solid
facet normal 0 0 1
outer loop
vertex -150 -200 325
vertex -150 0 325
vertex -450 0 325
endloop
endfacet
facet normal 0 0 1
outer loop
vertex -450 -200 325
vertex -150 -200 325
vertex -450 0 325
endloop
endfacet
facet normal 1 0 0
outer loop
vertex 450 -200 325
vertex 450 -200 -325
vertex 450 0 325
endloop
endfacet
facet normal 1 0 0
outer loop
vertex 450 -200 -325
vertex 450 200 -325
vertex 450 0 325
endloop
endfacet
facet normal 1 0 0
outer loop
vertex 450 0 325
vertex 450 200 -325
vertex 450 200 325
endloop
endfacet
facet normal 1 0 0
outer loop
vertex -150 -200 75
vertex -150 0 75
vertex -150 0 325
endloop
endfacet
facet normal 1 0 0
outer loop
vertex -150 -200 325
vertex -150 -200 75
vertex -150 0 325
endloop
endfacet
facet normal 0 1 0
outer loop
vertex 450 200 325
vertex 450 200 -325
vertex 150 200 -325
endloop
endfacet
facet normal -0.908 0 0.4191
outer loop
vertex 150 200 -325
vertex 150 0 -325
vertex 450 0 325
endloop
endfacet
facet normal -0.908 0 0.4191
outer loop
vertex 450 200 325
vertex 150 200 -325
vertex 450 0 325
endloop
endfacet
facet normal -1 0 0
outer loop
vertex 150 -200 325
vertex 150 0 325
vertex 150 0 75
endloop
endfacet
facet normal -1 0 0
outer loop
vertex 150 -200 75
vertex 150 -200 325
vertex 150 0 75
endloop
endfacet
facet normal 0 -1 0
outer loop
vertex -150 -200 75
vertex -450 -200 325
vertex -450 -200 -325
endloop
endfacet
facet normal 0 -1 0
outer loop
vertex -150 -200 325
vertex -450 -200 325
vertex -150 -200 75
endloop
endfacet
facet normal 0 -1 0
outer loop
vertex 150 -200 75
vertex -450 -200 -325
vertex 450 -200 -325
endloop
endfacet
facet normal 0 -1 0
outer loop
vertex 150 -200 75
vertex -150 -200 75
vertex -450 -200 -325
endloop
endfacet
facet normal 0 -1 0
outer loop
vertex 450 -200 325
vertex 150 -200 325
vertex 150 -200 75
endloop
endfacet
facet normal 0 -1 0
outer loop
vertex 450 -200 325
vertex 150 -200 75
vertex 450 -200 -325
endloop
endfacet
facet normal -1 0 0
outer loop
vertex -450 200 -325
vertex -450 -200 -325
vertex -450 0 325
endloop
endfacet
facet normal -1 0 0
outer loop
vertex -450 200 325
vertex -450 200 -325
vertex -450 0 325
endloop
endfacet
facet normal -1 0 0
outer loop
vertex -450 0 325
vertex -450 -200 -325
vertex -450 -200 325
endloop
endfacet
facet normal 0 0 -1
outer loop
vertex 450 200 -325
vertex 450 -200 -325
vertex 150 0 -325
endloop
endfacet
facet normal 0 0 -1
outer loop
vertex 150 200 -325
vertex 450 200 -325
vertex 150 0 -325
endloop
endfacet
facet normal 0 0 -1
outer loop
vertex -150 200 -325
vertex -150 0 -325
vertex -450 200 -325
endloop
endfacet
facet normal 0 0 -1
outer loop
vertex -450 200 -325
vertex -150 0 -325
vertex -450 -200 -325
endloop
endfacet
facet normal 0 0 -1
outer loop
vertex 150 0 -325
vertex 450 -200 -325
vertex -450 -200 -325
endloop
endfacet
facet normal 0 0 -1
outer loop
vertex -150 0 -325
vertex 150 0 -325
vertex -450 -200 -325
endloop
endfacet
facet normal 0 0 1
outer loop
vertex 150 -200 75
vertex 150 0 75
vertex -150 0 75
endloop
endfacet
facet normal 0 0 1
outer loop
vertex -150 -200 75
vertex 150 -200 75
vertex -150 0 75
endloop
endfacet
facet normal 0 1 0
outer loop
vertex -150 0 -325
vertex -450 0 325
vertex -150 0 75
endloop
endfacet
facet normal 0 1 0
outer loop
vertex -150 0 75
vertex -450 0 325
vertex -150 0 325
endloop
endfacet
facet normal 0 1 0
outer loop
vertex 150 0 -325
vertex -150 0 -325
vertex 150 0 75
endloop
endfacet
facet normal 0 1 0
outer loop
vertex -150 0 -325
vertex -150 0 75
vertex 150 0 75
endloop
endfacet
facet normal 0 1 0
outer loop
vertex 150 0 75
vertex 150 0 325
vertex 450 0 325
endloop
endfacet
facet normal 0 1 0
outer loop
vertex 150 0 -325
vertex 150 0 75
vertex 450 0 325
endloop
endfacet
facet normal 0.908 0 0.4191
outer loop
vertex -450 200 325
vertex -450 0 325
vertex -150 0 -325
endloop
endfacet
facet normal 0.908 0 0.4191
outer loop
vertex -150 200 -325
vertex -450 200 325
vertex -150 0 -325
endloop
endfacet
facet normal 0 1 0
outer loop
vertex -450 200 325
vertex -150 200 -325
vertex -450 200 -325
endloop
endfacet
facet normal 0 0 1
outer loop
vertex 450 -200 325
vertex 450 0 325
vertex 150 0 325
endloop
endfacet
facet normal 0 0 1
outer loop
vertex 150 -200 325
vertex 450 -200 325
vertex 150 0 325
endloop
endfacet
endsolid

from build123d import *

# Parameters (mm, degrees)
F1_DEPTH = 200
F3_DEPTH = 200


with BuildPart() as f1:
    # F0 (on Front) → F1 (new body)
    with BuildSketch(Plane.XZ):
        Polygon((-150, 325), (-450, 325), (-450, -325), (450, -325), (450, 325), (150, 325), (150, 75), (-150, 75), align=None)
    extrude(amount=F1_DEPTH)

    # F2 (on face) → F3 (join)
    with BuildSketch(Plane(origin=(0, 0, 0), x_dir=(-1, 0, 0), z_dir=(0, 1, 0))):
        Polygon((450, -325), (450, 325), (150, -325), align=None)
        Polygon((-150, -325), (-450, 325), (-450, -325), align=None)
    extrude(amount=F3_DEPTH)


solid = f1.part
